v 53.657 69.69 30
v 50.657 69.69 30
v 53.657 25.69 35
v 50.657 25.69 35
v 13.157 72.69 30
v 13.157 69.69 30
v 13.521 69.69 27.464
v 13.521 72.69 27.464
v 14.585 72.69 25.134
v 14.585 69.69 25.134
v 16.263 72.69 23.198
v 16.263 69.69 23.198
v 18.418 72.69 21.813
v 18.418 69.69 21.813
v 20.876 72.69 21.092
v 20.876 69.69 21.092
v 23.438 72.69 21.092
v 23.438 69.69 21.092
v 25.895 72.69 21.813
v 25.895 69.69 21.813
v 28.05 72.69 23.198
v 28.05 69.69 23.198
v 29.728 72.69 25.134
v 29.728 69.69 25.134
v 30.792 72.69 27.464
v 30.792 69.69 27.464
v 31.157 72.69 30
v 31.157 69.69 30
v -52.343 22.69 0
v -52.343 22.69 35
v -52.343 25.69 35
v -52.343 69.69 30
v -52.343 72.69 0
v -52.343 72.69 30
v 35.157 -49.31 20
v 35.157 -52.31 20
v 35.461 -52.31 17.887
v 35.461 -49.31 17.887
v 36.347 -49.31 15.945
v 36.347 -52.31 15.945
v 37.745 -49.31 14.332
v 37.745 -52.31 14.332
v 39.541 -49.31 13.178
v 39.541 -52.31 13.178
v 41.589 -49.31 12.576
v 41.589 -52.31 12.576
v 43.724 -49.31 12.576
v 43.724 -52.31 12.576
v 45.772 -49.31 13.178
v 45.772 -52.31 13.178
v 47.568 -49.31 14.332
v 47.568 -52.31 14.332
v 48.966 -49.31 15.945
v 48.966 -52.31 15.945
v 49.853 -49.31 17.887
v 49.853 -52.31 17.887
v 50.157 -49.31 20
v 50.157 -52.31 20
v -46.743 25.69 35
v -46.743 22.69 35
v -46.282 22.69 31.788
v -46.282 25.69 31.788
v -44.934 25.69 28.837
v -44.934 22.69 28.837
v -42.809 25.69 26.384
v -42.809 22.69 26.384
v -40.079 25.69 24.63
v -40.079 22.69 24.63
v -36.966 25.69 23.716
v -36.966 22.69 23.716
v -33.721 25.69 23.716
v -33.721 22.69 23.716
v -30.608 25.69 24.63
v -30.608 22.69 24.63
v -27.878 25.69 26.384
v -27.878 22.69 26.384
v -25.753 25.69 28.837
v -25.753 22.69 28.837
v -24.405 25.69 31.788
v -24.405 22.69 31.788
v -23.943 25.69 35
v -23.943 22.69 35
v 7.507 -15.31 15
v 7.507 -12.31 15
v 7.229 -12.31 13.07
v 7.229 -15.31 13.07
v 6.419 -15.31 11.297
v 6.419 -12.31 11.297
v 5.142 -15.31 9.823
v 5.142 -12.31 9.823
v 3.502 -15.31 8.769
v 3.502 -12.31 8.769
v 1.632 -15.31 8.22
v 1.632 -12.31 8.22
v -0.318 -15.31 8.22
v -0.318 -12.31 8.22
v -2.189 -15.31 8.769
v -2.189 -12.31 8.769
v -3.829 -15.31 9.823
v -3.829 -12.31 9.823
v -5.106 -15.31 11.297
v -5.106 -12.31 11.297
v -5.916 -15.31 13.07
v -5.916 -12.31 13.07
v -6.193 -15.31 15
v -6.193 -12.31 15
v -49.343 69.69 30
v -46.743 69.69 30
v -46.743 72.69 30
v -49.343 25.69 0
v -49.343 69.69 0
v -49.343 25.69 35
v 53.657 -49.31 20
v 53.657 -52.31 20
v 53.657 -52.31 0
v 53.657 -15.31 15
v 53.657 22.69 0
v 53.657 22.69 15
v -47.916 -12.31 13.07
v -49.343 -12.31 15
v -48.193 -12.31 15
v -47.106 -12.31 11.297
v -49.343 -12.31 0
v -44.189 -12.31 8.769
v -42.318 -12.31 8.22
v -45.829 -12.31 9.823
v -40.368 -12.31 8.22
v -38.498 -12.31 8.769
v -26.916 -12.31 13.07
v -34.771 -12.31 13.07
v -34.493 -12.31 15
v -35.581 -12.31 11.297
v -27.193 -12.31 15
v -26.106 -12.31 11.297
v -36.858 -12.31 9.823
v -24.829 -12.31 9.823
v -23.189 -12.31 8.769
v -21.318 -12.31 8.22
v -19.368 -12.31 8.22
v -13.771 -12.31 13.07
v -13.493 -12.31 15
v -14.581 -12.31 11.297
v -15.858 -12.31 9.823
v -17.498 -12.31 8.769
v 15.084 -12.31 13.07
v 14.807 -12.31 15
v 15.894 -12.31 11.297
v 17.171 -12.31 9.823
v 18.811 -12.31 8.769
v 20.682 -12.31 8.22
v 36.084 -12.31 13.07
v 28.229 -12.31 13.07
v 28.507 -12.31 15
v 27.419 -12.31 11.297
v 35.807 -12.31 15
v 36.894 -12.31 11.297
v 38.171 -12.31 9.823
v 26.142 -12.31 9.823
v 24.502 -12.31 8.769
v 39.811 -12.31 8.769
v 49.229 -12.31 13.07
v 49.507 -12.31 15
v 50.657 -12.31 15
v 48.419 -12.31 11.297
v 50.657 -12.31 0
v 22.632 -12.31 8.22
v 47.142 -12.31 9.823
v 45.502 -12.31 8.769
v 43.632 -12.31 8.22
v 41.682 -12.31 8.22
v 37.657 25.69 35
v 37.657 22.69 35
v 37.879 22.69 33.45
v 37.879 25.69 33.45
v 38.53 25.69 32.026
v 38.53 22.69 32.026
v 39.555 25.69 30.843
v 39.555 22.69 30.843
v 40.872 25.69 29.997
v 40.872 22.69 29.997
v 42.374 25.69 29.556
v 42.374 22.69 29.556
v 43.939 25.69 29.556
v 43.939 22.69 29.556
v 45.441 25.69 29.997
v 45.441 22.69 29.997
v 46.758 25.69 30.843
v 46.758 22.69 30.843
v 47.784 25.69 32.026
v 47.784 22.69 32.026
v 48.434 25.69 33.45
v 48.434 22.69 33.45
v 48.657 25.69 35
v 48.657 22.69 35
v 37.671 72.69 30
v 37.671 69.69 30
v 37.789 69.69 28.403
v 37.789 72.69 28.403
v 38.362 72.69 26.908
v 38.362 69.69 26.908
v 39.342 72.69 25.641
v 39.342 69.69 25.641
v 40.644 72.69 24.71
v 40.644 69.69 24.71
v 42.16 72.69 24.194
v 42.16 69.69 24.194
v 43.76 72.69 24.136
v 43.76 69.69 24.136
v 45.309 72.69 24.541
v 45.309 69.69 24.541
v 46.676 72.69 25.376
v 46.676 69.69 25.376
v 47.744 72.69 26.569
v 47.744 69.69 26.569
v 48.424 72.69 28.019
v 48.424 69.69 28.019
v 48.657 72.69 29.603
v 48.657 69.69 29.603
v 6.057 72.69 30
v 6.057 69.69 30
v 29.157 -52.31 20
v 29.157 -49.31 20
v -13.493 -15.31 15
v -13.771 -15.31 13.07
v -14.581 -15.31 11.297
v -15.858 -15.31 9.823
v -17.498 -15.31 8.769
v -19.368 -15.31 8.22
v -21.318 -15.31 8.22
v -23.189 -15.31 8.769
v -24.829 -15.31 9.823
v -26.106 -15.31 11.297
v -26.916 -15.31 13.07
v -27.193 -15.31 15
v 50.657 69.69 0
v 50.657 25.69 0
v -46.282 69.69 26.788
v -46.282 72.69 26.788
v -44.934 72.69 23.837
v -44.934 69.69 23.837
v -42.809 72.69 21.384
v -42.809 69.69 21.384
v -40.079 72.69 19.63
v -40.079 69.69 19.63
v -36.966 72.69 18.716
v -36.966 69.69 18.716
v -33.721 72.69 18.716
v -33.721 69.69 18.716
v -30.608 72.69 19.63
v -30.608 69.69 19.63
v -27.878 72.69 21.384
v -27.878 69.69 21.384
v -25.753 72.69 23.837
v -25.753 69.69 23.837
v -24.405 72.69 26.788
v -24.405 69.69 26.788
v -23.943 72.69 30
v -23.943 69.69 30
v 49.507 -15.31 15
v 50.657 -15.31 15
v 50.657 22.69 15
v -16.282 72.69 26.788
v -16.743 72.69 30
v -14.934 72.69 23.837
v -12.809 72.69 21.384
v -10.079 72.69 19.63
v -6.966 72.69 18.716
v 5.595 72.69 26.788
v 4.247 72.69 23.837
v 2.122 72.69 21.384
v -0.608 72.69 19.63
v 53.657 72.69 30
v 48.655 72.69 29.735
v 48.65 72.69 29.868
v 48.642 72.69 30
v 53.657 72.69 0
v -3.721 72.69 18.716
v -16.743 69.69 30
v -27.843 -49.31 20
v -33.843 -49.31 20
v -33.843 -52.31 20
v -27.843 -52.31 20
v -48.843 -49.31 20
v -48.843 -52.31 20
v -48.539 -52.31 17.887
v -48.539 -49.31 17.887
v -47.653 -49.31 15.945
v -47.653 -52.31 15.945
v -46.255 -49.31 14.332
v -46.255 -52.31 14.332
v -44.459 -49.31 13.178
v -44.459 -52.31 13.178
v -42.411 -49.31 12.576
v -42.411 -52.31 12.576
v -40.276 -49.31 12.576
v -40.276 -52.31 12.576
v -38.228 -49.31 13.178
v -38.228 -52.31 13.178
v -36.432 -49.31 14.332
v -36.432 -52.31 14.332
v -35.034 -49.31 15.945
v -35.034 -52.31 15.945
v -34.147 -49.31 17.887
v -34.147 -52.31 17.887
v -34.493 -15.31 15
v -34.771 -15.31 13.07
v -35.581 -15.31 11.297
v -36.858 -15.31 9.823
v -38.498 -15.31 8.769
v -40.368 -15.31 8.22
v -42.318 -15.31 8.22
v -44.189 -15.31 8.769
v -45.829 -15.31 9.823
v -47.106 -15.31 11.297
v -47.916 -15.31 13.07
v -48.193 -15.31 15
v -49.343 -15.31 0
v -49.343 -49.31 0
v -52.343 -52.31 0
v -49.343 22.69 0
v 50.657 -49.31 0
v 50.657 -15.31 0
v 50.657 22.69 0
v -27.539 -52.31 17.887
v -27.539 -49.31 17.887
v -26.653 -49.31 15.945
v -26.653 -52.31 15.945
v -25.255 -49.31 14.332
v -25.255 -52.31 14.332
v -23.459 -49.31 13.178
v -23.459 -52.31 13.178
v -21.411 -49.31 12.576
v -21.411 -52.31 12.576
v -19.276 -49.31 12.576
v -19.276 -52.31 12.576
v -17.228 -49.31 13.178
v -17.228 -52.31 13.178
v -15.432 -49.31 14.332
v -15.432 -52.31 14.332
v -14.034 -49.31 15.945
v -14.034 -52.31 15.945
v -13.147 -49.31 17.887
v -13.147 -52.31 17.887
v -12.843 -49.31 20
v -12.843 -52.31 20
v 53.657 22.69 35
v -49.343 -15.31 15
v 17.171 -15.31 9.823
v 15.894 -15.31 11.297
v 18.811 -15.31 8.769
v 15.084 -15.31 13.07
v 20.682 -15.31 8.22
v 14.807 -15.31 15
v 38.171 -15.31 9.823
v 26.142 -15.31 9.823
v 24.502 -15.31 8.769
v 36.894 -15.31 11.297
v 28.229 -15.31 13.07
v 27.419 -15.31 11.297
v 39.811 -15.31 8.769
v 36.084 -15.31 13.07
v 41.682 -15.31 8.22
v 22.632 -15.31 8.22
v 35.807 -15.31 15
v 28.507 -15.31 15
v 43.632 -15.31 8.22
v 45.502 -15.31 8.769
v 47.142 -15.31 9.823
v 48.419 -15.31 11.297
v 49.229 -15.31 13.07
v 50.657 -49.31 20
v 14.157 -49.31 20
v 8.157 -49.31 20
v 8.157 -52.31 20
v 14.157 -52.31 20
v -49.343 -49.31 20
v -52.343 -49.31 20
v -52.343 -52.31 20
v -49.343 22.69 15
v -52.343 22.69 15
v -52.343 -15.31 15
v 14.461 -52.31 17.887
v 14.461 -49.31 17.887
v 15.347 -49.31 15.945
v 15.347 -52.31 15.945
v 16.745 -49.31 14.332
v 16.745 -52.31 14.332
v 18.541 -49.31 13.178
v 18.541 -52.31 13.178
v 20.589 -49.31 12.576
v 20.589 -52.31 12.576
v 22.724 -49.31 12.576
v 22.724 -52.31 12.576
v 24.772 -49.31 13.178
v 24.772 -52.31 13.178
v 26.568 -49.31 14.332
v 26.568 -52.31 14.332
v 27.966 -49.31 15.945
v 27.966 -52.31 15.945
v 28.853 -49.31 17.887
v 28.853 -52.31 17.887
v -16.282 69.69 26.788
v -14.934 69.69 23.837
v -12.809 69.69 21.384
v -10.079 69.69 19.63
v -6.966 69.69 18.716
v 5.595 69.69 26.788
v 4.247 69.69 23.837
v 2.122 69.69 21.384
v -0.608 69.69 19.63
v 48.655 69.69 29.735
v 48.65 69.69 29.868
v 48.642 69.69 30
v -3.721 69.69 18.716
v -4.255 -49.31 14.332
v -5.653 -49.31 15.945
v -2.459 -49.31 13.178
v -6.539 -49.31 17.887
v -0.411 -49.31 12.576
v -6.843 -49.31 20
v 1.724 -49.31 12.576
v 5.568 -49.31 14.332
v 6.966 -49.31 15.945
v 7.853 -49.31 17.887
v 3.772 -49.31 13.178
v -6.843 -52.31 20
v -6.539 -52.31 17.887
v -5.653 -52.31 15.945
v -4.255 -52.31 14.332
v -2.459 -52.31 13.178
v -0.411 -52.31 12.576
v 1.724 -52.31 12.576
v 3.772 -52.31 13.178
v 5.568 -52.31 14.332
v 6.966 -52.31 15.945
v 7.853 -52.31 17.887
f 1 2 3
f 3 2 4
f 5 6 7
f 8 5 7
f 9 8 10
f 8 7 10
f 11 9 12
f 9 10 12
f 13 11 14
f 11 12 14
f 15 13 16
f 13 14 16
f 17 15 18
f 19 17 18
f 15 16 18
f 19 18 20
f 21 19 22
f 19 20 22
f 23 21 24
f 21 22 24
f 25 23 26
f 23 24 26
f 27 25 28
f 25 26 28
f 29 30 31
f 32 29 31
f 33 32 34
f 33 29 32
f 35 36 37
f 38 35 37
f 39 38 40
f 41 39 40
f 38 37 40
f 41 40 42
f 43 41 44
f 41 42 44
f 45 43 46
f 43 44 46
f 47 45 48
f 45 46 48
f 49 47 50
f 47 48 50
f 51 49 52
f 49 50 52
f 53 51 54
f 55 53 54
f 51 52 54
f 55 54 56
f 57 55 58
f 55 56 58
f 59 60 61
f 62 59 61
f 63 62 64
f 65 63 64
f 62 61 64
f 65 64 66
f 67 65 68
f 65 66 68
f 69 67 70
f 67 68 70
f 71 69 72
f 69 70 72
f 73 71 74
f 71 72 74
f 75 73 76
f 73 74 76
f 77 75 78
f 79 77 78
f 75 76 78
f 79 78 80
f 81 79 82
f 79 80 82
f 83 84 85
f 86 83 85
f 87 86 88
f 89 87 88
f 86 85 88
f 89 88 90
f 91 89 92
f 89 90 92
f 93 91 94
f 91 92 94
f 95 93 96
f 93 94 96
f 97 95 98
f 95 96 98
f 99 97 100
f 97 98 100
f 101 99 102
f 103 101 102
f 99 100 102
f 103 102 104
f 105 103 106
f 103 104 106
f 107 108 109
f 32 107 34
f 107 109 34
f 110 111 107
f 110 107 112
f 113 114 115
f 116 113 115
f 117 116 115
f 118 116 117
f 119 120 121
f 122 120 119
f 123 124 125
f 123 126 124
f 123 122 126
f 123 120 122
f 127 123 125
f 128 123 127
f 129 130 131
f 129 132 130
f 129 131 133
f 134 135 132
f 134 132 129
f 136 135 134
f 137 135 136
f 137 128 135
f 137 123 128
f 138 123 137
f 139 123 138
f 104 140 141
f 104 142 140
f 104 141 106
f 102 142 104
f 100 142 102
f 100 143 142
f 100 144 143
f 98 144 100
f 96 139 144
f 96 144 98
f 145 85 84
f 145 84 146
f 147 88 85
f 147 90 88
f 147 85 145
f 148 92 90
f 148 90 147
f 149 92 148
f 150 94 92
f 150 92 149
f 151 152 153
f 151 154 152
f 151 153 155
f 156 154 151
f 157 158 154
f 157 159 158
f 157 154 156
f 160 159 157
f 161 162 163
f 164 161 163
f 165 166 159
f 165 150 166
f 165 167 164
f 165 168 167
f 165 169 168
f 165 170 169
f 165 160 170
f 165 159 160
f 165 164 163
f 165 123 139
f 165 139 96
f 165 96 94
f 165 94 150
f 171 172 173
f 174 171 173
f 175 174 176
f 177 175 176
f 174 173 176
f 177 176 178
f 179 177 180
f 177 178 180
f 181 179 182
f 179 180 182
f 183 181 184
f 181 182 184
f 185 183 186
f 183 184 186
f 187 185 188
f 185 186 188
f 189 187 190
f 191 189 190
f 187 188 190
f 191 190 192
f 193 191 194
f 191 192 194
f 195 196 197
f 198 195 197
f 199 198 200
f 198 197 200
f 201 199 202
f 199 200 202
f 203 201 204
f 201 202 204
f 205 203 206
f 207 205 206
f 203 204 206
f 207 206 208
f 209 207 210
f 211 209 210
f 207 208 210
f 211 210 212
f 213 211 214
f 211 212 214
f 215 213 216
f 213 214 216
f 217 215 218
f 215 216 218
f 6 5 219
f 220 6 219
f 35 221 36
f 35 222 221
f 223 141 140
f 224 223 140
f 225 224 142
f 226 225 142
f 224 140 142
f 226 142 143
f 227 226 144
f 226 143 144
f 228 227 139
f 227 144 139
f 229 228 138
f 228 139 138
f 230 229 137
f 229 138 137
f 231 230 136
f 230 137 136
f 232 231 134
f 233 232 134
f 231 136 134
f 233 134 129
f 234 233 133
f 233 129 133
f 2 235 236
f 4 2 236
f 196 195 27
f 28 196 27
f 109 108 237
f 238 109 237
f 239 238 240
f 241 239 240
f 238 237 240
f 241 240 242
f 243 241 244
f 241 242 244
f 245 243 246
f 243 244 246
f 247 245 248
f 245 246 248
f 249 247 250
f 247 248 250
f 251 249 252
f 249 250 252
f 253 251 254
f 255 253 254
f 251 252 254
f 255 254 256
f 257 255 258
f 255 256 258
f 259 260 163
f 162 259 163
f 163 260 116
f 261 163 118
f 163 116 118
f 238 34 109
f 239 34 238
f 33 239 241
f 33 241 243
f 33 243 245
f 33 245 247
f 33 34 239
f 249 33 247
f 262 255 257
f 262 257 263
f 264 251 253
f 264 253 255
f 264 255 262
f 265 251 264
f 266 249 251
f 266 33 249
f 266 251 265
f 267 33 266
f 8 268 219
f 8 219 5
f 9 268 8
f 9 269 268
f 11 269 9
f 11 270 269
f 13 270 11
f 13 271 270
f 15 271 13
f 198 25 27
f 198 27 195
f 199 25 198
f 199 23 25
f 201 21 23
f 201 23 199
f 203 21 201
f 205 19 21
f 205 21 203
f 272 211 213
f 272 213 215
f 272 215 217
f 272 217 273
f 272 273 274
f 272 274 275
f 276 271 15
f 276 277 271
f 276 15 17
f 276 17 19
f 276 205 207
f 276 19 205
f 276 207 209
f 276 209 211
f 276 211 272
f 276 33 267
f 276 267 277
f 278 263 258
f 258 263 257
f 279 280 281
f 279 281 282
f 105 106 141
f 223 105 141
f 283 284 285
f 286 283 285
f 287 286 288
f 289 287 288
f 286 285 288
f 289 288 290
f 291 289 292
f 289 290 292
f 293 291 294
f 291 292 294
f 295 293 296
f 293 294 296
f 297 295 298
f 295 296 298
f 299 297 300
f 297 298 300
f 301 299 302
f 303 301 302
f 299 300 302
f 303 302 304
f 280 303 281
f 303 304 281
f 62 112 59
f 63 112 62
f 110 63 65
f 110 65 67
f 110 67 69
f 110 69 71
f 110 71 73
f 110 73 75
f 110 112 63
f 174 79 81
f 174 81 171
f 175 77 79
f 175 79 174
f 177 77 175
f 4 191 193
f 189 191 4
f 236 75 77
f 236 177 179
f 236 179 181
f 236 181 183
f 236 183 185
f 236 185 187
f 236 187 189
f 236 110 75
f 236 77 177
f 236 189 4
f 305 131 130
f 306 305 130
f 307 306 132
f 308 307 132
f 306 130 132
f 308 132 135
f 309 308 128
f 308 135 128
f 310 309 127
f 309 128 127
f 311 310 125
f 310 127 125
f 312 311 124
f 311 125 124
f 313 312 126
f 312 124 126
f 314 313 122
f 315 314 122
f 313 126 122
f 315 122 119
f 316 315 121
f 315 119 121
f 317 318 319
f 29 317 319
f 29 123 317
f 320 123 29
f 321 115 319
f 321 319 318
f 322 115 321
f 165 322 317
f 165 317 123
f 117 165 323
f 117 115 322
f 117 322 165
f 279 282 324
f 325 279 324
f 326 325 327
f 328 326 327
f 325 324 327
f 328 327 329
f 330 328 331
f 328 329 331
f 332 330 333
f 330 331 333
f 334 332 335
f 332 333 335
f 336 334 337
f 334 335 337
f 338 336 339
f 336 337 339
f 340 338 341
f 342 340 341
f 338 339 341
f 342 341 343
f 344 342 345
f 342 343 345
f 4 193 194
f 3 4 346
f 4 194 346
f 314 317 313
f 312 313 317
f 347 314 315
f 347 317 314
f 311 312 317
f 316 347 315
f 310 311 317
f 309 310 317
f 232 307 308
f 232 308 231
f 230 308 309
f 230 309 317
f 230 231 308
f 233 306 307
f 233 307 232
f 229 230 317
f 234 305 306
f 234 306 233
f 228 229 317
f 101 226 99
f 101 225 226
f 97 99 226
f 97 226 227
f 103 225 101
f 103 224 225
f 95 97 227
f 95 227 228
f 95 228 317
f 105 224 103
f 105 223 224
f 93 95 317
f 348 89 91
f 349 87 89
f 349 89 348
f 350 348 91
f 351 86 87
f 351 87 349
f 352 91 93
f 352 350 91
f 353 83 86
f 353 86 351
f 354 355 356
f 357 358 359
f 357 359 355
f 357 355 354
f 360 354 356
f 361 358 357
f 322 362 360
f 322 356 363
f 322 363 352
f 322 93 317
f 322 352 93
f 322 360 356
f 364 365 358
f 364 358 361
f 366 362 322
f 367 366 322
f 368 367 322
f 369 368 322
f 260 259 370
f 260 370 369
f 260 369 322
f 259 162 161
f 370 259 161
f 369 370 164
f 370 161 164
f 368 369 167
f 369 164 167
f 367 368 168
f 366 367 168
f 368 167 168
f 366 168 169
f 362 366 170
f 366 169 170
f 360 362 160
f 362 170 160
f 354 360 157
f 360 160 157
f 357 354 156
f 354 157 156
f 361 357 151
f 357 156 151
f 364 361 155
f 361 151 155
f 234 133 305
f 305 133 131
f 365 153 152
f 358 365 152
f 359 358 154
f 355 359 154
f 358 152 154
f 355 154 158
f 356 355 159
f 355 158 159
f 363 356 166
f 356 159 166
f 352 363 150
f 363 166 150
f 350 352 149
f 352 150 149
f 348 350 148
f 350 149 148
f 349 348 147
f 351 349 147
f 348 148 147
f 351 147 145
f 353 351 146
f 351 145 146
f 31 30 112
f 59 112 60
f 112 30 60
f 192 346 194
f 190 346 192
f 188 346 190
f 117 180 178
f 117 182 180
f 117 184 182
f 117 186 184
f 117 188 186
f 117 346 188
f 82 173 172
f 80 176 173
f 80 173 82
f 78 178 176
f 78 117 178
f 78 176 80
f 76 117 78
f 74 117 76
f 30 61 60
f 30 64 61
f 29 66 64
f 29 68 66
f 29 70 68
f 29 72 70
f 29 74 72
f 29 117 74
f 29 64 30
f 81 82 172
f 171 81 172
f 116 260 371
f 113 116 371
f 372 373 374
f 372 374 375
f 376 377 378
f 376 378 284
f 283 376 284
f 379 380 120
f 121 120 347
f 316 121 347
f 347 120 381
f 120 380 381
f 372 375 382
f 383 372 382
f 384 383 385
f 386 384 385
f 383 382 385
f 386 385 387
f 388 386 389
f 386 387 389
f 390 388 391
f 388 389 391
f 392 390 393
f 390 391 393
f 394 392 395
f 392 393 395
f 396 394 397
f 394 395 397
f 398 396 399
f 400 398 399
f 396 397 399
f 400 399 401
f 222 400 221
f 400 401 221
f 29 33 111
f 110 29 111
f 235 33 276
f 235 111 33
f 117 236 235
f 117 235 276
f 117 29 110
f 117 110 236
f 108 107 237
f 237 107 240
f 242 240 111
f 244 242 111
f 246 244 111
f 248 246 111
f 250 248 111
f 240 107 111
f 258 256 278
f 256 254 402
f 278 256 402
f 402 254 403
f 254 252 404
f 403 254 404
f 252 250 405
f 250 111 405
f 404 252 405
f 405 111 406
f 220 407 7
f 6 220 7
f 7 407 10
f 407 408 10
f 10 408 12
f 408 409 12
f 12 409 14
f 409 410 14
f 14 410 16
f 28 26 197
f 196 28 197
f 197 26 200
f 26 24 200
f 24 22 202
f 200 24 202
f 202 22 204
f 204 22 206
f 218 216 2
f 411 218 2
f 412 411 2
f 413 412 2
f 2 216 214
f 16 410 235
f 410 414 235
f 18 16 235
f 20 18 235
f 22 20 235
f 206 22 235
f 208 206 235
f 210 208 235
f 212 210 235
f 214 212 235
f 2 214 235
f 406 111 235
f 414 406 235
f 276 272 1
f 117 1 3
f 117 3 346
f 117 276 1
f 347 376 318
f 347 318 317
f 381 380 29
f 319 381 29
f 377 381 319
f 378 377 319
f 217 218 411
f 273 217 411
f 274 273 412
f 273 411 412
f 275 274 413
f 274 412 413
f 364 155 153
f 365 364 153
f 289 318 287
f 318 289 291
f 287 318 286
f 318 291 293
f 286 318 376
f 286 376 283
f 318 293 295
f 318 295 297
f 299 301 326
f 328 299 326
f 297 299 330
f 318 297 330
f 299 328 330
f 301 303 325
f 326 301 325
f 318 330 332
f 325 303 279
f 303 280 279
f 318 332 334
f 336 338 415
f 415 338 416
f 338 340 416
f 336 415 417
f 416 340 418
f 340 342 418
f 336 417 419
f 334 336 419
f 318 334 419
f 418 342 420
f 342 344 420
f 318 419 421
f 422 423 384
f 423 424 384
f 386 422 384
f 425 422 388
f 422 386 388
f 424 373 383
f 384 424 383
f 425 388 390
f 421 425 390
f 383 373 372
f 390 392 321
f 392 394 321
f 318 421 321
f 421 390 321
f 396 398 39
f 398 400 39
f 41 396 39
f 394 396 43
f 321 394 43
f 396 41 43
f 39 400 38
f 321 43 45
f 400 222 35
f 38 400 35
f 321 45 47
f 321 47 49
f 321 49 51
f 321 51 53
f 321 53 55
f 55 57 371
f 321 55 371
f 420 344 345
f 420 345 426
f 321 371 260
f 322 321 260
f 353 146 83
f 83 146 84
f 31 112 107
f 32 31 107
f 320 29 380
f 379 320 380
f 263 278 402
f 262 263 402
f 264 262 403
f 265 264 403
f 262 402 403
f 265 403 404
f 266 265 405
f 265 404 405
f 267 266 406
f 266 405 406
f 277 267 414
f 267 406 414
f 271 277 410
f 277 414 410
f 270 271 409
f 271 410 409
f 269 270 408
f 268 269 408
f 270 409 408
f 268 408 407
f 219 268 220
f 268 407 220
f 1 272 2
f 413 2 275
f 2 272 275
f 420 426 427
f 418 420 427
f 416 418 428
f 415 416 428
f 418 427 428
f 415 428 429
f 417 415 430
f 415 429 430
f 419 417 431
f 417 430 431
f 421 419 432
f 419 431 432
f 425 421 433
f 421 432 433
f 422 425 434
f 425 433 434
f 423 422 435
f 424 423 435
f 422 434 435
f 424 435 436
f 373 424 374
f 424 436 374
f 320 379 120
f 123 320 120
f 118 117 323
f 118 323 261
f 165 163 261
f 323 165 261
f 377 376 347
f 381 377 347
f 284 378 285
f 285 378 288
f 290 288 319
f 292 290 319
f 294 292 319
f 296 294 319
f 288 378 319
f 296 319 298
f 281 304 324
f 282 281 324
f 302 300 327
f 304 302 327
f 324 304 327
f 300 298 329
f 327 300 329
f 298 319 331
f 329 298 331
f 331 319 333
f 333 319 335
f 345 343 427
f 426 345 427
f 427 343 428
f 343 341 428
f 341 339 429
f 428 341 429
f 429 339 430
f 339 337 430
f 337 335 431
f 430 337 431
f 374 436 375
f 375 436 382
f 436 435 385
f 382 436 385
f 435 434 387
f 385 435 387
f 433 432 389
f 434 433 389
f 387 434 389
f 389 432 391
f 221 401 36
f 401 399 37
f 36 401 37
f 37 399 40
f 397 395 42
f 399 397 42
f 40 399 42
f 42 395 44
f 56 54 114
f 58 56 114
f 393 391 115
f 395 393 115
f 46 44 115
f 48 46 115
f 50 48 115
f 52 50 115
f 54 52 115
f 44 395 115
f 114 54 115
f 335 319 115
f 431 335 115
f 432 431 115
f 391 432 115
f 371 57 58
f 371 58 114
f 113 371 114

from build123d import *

# Parameters (mm, degrees)
F0_W      = 106
F0_H      = 40
F1_DEPTH  = 20
F2_W      = 100
F2_H      = 34
F3_DEPTH  = 20
F6_DEPTH  = 3
F7_W      = 106
F7_H      = 5
F8_DEPTH  = 3
F10_DEPTH = 3
F12_W     = 35
F12_H     = 15
F13_DEPTH = 3
F11_W     = 35
F11_H     = 15
F14_DEPTH = 3
F15_W     = 100
F15_H     = 44
F16_DEPTH = 35
F18_DEPTH = 3
F20_DEPTH = 3
F22_DEPTH = 3
F23_W     = 106
F23_H     = 5
F24_DEPTH = 3
F26_DEPTH = 3
F28_DEPTH = 3
F30_DEPTH = 3


# Not quite as in the source:
# - a feature names something its author has since deleted; it is built from what else it names


with BuildPart() as f1:
    # F0 (on Top) → F1 (new body)
    with BuildSketch(Plane.XY):
        with Locations((0.6567015983, -32.3096490646)):
            Rectangle(F0_W, F0_H)
    extrude(amount=F1_DEPTH)

    # F2 (on face) → F3 (cut)
    with BuildSketch(Plane.XY.offset(20)):
        with Locations((0.6567015983, -32.3096490646)):
            Rectangle(F2_W, F2_H)
    extrude(amount=-F3_DEPTH, mode=Mode.SUBTRACT)

    # F5 (on face) + F4 (on face) → F6 (cut)
    with BuildSketch(Plane.XZ.offset(52.3096490646)):
        with BuildLine():
            ThreePointArc((-33.8432984017, 20), (-41.3432984017, 27.5), (-48.8432984017, 20))
            Line((-48.8432984017, 20), (-33.8432984017, 20))
        make_face()
    with BuildSketch(Plane.XZ.offset(52.3096490646)):
        with BuildLine():
            ThreePointArc((-48.8432984017, 20), (-41.3432984017, 12.5), (-33.8432984017, 20))
            Line((-33.8432984017, 20), (-48.8432984017, 20))
        make_face()
        with BuildLine():
            Line((-12.8432984017, 20), (-27.8432984017, 20))
            ThreePointArc((-27.8432984017, 20), (-20.3432984017, 12.5), (-12.8432984017, 20))
        make_face()
        with BuildLine():
            Line((8.1567015983, 20), (-6.8432984017, 20))
            ThreePointArc((-6.8432984017, 20), (0.6567015983, 12.5), (8.1567015983, 20))
        make_face()
        with BuildLine():
            Line((29.1567015983, 20), (14.1567015983, 20))
            ThreePointArc((14.1567015983, 20), (21.6567015983, 12.5), (29.1567015983, 20))
        make_face()
        with BuildLine():
            ThreePointArc((35.1567015983, 20), (42.6567015983, 12.5), (50.1567015983, 20))
            Line((50.1567015983, 20), (35.1567015983, 20))
        make_face()
    extrude(amount=-F6_DEPTH, mode=Mode.SUBTRACT)

    # F7 (on face) → F8 (cut)
    with BuildSketch(Plane(origin=(0, -12.3096490646, 0), x_dir=(-1, 0, 0), z_dir=(0, 1, 0))):
        with Locations((-0.6567015983, 17.5)):
            Rectangle(F7_W, F7_H)
    extrude(amount=-F8_DEPTH, mode=Mode.SUBTRACT)

    # F9 (on face) → F10 (cut)
    with BuildSketch(Plane(origin=(0, -12.3096490646, 0), x_dir=(-1, 0, 0), z_dir=(0, 1, 0))):
        with BuildLine():
            Line((34.4932984017, 15), (48.1932984017, 15))
            ThreePointArc((48.1932984017, 15), (41.3432984017, 21.85), (34.4932984017, 15))
        make_face()
        with BuildLine():
            ThreePointArc((34.4932984017, 15), (41.3432984017, 8.15), (48.1932984017, 15))
            Line((48.1932984017, 15), (34.4932984017, 15))
        make_face()
        with BuildLine():
            Line((13.4932984017, 15), (27.1932984017, 15))
            ThreePointArc((27.1932984017, 15), (20.3432984017, 21.85), (13.4932984017, 15))
        make_face()
        with BuildLine():
            ThreePointArc((13.4932984017, 15), (20.3432984017, 8.15), (27.1932984017, 15))
            Line((27.1932984017, 15), (13.4932984017, 15))
        make_face()
        with BuildLine():
            Line((-7.5067015983, 15), (6.1932984017, 15))
            ThreePointArc((6.1932984017, 15), (-0.6567015983, 21.85), (-7.5067015983, 15))
        make_face()
        with BuildLine():
            ThreePointArc((-7.5067015983, 15), (-0.6567015983, 8.15), (6.1932984017, 15))
            Line((6.1932984017, 15), (-7.5067015983, 15))
        make_face()
        with BuildLine():
            Line((-35.8067015983, 15), (-49.5067015983, 15))
            ThreePointArc((-49.5067015983, 15), (-42.6567015983, 8.15), (-35.8067015983, 15))
        make_face()
        with BuildLine():
            ThreePointArc((-28.5067015983, 15), (-21.6567015983, 8.15), (-14.8067015983, 15))
            Line((-14.8067015983, 15), (-28.5067015983, 15))
        make_face()
    extrude(amount=-F10_DEPTH, mode=Mode.SUBTRACT)

    # F12 (on face) → F13 (join)
    with BuildSketch(Plane(origin=(-52.3432984017, 0, 0), x_dir=(0, -1, 0), z_dir=(-1, 0, 0))):
        with Locations((-5.1903509354, 7.5)):
            Rectangle(F12_W, F12_H)
    extrude(amount=-F13_DEPTH)

    # F11 (on face) → F14 (join)
    with BuildSketch(Plane.YZ.offset(53.6567015983)):
        with Locations((5.1903509354, 7.5)):
            Rectangle(F11_W, F11_H)
    extrude(amount=-F14_DEPTH)

    # F19 (on face) → F20 (cut)
    with BuildSketch(Plane(origin=(50.6567015983, 0, 0), x_dir=(0, -1, 0), z_dir=(-1, 0, 0))):
        Polygon((15.3096490646, 15), (49.3096490646, 20), (15.3096490646, 20), align=None)
    extrude(amount=-F20_DEPTH, mode=Mode.SUBTRACT)

    # F21 (on face) → F22 (cut)
    with BuildSketch(Plane.YZ.offset(-49.3432984017)):
        Polygon((-15.3096490646, 20), (-49.3096490646, 20), (-15.3096490646, 15), align=None)
    extrude(amount=-F22_DEPTH, mode=Mode.SUBTRACT)


with BuildPart() as f16:
    # F15 (on face) → F16 (new body)
    with BuildSketch(Plane(origin=(0, 0, 0), x_dir=(1, 0, 0), z_dir=(0, 0, -1))):
        Polygon((-49.3432984017, -22.6903509354), (-52.3432984017, -22.6903509354), (-52.3432984017, -72.6903509354), (53.6567015983, -72.6903509354), (53.6567015983, -22.6903509354), (50.6567015983, -22.6903509354), align=None)
        with Locations((0.6567015983, -47.6903509354)):
            Rectangle(F15_W, F15_H, mode=Mode.SUBTRACT)
    extrude(amount=-F16_DEPTH)

    # F17 (on face) → F18 (cut)
    with BuildSketch(Plane.XZ.offset(-22.6903509354)):
        with BuildLine():
            ThreePointArc((-46.7432984017, 35), (-35.3432984017, 23.6), (-23.9432984017, 35))
            Line((-23.9432984017, 35), (-46.7432984017, 35))
        make_face()
        with BuildLine():
            Line((48.6567015983, 35), (37.6567015983, 35))
            ThreePointArc((37.6567015983, 35), (43.1567015983, 29.5), (48.6567015983, 35))
        make_face()
    extrude(amount=-F18_DEPTH, mode=Mode.SUBTRACT)

    # F23 (on face) → F24 (cut)
    with BuildSketch(Plane(origin=(0, 72.6903509354, 0), x_dir=(-1, 0, 0), z_dir=(0, 1, 0))):
        with Locations((-0.6567015983, 32.5)):
            Rectangle(F23_W, F23_H)
    extrude(amount=-F24_DEPTH, mode=Mode.SUBTRACT)

    # F25 (on face) → F26 (cut)
    with BuildSketch(Plane.YZ.offset(-49.3432984017)):
        Polygon((69.6903509354, 35), (25.6903509354, 35), (69.6903509354, 30), align=None)
    extrude(amount=-F26_DEPTH, mode=Mode.SUBTRACT)

    # F27 (on face) → F28 (cut)
    with BuildSketch(Plane(origin=(50.6567015983, 0, 0), x_dir=(0, -1, 0), z_dir=(-1, 0, 0))):
        Polygon((-69.6903509354, 30), (-25.6903509354, 35), (-69.6903509354, 35), align=None)
    extrude(amount=-F28_DEPTH, mode=Mode.SUBTRACT)

    # F29 (on face) → F30 (cut)
    with BuildSketch(Plane.XZ.offset(-69.6903509354)):
        with BuildLine():
            ThreePointArc((-46.7432984017, 30), (-35.3432984017, 18.6), (-23.9432984017, 30))
            Line((-23.9432984017, 30), (-46.7432984017, 30))
        make_face()
        with BuildLine():
            Line((6.0567015983, 30), (-16.7432984017, 30))
            ThreePointArc((-16.7432984017, 30), (-5.3432984017, 18.6), (6.0567015983, 30))
        make_face()
        with BuildLine():
            Line((31.1567015983, 30), (13.1567015983, 30))
            ThreePointArc((13.1567015983, 30), (22.1567015983, 21), (31.1567015983, 30))
        make_face()
        with BuildLine():
            ThreePointArc((31.1567015983, 30), (22.1567015983, 39), (13.1567015983, 30))
            Line((13.1567015983, 30), (31.1567015983, 30))
        make_face()
        with BuildLine():
            Line((48.6423386246, 30), (37.6710645721, 30))
            ThreePointArc((37.6710645721, 30), (42.9579601135, 24.1063685331), (48.6567015983, 29.6027766168))
            ThreePointArc((48.6567015983, 29.6027766168), (48.653109682, 29.8015181016), (48.6423386246, 30))
        make_face()
        with BuildLine():
            ThreePointArc((48.6423386246, 30), (43.1567015983, 35.1027766168), (37.6710645721, 30))
            Line((37.6710645721, 30), (48.6423386246, 30))
        make_face()
    extrude(amount=-F30_DEPTH, mode=Mode.SUBTRACT)


solid = Compound([f1.part, f16.part])
